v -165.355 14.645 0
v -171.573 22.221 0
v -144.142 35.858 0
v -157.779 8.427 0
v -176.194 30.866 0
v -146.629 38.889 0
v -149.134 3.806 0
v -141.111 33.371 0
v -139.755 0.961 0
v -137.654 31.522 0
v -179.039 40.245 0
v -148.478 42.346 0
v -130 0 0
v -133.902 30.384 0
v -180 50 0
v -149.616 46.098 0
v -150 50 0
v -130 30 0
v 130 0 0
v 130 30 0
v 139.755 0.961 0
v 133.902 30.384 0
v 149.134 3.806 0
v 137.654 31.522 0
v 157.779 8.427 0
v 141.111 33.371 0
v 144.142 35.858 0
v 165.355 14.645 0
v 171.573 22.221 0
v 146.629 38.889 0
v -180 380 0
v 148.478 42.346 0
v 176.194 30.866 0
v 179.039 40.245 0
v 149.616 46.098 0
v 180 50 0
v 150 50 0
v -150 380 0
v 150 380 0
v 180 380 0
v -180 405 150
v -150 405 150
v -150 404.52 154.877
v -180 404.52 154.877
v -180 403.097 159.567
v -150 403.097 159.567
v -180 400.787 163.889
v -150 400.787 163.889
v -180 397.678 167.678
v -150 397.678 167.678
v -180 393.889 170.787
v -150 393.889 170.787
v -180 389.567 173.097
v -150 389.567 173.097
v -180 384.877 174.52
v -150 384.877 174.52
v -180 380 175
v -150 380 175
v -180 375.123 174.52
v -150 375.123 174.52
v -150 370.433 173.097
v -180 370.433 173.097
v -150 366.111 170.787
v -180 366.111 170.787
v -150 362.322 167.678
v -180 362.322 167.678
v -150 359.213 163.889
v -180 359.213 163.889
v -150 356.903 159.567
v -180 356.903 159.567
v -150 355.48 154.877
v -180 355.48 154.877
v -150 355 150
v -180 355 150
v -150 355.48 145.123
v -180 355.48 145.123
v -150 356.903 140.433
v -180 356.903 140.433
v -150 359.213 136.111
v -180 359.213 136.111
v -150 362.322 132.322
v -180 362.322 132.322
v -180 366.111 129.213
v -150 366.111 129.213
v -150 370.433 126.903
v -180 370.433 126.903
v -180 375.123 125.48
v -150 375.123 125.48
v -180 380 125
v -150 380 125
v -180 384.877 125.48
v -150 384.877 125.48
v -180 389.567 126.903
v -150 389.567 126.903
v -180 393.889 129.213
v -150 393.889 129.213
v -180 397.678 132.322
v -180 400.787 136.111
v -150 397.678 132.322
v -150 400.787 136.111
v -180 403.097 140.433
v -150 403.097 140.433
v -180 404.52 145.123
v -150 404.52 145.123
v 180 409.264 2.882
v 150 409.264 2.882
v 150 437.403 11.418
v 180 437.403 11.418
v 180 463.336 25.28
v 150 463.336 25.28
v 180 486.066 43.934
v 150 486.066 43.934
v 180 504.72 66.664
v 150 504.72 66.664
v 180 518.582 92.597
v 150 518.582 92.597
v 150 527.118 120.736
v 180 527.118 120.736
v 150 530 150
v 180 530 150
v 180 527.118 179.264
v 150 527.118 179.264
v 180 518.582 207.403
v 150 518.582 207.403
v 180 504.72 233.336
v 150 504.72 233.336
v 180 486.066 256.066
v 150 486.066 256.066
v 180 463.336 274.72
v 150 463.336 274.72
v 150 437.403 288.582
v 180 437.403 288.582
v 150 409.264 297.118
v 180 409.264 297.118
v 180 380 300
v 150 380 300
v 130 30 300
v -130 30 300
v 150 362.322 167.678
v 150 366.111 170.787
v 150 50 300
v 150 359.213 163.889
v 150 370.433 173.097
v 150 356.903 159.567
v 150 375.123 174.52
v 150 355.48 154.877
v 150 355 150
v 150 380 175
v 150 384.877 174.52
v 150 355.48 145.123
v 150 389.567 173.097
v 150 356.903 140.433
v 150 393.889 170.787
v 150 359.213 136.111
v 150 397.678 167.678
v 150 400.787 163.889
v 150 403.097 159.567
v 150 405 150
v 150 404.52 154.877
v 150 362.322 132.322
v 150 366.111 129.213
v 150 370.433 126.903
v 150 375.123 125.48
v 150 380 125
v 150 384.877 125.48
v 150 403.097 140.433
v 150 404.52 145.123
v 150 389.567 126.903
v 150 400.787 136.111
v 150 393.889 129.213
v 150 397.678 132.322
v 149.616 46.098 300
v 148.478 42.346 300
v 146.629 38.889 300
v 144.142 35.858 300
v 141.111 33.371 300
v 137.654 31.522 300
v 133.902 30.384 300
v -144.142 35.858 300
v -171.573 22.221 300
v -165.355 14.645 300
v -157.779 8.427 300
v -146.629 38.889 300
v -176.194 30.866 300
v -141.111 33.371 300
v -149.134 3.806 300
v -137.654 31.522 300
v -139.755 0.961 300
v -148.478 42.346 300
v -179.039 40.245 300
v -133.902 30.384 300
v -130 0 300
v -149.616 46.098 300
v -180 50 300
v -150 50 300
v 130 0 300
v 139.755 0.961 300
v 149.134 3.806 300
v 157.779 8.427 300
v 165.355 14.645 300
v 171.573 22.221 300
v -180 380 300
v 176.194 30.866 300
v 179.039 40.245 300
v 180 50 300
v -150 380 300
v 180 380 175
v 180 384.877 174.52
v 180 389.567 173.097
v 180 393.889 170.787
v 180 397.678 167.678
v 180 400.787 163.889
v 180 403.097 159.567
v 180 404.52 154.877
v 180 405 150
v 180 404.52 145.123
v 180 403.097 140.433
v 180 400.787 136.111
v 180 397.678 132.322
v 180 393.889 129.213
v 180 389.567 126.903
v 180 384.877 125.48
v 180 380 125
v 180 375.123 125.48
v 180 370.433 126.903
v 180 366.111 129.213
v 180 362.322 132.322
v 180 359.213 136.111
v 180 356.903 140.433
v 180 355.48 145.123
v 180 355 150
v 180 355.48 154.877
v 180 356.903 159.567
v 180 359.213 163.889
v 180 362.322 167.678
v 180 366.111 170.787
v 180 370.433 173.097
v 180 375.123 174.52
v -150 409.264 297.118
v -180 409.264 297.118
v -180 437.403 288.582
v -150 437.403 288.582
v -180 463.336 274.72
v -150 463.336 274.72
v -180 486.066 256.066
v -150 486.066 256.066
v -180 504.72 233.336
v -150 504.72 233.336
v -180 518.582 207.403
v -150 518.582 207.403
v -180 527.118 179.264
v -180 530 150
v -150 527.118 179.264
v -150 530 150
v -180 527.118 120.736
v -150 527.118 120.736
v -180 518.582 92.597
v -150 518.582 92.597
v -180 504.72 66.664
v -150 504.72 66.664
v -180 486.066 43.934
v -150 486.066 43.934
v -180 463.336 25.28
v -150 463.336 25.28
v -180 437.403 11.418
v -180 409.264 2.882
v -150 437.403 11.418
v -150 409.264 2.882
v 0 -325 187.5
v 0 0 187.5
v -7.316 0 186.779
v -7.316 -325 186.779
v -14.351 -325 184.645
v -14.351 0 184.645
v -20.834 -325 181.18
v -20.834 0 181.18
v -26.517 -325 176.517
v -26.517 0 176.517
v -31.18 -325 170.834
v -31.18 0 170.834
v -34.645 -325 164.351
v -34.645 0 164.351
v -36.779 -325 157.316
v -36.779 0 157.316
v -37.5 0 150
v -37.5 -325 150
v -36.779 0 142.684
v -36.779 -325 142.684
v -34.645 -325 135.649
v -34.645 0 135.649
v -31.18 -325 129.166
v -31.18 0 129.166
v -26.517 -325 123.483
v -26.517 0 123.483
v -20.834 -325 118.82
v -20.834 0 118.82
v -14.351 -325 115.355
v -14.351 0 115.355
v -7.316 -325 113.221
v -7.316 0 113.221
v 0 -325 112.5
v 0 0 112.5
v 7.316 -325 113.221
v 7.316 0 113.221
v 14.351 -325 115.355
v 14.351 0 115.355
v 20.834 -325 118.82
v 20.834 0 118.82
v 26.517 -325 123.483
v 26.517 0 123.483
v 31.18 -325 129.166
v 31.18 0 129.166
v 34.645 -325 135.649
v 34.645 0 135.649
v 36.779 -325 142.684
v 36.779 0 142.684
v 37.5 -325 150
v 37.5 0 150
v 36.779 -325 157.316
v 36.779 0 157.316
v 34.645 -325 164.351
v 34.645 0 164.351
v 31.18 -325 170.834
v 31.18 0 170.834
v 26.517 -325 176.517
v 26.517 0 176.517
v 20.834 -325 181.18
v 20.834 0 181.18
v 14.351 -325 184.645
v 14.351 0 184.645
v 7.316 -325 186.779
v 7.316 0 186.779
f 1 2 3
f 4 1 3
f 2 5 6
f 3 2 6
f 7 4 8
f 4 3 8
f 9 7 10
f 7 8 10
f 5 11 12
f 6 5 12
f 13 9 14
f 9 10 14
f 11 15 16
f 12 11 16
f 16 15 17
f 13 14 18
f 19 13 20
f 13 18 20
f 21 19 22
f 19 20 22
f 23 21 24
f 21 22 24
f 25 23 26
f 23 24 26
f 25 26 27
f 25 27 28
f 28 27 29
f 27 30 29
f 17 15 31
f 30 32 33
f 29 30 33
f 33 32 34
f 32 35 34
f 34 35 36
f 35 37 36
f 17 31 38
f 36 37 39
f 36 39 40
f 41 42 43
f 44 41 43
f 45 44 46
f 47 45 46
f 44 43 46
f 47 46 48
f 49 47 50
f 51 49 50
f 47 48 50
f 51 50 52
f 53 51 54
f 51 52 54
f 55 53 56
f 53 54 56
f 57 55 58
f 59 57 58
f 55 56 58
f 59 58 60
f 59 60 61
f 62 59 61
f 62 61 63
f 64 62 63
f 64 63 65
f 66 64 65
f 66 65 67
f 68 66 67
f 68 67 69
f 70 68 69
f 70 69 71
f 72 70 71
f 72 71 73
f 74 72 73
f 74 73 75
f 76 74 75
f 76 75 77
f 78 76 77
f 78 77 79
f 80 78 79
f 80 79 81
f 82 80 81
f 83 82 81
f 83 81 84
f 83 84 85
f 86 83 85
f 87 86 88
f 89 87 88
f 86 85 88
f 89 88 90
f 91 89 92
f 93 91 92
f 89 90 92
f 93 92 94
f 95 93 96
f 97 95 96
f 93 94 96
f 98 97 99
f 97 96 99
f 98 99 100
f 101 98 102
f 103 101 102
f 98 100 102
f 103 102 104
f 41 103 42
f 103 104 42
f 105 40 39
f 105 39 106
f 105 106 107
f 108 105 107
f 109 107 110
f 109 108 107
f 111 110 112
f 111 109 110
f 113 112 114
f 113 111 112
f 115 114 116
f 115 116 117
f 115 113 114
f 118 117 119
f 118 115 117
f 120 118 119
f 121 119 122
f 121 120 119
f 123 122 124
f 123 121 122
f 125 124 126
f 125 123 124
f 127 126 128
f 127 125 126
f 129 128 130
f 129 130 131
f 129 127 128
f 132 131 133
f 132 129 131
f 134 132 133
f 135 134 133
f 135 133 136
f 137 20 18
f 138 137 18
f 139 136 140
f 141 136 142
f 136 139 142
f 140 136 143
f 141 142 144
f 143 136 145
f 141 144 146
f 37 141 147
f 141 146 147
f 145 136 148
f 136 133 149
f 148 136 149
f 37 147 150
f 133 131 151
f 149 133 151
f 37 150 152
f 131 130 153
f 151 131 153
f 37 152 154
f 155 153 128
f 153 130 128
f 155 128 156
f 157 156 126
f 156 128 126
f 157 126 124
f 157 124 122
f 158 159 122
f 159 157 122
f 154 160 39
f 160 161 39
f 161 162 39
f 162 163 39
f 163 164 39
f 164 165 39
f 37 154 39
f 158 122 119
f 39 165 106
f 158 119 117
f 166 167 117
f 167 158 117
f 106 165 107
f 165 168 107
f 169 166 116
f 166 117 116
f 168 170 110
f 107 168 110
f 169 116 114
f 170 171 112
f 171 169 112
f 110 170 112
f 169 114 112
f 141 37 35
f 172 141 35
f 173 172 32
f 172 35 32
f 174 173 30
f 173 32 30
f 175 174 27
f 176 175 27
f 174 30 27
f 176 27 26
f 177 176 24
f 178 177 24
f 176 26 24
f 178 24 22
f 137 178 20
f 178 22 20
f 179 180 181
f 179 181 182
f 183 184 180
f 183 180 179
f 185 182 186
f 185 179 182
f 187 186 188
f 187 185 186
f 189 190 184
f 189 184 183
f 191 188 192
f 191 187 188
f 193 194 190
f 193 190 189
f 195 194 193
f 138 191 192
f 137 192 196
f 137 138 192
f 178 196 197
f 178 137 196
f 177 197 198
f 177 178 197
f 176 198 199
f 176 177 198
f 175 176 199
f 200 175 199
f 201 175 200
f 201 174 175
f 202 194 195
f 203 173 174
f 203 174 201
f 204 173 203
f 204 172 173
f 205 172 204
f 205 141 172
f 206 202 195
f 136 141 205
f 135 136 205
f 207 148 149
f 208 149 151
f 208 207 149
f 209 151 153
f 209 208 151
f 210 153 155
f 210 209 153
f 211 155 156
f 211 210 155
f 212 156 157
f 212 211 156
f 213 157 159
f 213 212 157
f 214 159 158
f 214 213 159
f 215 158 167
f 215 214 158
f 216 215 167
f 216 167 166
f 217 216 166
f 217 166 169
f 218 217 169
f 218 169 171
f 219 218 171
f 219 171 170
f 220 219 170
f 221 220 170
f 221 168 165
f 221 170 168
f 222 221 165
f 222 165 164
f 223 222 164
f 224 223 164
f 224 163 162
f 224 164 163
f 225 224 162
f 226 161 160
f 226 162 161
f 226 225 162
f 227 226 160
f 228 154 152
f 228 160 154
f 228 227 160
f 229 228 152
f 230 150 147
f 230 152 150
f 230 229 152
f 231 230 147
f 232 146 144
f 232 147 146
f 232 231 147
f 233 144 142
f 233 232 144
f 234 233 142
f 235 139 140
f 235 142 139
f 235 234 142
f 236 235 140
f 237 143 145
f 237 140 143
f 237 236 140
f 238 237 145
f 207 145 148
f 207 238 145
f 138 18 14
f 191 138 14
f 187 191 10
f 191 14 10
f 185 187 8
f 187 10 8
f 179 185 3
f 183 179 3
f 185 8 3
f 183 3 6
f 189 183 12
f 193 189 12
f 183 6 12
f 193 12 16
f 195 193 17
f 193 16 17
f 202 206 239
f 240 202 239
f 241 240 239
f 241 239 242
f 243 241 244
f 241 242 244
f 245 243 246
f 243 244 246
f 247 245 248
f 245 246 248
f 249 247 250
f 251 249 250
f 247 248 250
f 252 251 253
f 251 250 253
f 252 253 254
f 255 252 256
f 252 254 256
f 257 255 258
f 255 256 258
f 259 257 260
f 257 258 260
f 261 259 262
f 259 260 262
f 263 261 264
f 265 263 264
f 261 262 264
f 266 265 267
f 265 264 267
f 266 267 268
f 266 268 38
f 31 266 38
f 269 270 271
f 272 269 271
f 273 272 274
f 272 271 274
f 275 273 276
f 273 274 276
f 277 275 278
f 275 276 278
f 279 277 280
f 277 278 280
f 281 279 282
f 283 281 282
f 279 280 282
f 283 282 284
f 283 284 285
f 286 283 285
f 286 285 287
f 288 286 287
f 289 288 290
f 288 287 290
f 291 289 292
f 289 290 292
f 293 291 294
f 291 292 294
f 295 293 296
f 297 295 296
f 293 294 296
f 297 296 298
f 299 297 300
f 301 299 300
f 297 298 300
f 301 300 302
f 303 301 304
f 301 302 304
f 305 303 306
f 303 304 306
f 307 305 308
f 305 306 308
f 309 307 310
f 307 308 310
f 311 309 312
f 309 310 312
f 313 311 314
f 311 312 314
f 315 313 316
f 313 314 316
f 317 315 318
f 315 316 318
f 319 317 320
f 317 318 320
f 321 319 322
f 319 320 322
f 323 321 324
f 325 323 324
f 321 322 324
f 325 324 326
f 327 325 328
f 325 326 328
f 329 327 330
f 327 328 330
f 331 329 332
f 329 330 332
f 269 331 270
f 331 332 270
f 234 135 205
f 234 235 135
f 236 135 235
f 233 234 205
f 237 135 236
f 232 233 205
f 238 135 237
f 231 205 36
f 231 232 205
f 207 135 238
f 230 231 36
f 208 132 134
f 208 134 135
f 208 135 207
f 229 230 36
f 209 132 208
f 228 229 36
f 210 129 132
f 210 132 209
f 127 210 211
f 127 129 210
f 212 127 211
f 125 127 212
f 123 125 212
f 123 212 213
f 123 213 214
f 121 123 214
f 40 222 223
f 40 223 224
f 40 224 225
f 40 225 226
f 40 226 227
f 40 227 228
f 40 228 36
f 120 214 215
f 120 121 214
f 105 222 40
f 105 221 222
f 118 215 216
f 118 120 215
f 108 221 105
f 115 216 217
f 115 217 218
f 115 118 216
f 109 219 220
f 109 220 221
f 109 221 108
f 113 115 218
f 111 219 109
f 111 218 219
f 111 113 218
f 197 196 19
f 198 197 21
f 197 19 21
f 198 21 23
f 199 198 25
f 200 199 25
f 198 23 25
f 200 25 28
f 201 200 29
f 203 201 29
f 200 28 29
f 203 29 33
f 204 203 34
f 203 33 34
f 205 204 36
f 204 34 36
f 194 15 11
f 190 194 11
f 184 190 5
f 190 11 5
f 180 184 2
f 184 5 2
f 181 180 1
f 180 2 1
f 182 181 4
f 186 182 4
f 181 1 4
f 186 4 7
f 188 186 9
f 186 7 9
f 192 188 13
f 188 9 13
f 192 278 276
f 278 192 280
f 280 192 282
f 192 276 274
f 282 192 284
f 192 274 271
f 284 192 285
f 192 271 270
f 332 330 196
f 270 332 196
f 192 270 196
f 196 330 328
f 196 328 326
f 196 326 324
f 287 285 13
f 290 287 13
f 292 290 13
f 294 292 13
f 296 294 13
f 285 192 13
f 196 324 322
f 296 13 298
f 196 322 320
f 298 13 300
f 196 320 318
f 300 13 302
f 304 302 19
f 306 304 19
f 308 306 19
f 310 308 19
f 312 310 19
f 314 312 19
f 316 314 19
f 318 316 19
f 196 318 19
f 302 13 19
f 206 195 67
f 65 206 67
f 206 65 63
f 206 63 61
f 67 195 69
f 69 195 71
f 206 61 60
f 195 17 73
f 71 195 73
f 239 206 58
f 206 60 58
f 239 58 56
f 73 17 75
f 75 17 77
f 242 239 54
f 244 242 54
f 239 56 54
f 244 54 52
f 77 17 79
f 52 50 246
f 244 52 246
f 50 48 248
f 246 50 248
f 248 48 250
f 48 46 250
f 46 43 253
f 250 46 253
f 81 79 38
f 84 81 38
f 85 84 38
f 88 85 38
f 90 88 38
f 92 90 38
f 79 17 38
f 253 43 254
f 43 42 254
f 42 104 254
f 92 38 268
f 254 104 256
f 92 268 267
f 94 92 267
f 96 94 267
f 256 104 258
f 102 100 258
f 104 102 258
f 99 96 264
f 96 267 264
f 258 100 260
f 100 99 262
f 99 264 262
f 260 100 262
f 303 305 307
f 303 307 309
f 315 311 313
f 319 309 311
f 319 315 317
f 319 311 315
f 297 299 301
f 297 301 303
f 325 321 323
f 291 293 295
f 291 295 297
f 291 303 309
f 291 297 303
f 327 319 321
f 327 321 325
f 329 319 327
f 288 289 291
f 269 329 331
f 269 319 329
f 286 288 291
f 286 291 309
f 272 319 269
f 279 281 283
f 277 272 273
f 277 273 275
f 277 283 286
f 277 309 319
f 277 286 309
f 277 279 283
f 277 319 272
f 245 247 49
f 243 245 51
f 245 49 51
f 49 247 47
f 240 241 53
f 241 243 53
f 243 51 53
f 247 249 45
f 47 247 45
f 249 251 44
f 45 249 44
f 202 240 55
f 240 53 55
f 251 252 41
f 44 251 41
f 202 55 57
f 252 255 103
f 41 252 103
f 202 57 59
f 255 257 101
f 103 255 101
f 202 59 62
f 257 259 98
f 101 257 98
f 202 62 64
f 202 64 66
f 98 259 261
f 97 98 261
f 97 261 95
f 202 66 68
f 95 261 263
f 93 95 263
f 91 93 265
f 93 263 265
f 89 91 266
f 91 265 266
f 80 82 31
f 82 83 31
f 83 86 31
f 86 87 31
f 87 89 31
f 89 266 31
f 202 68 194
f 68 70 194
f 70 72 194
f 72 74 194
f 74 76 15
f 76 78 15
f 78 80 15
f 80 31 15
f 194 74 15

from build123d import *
from build123d.topology import SkipClean

# Parameters (mm, degrees)
BOSS_EXTRUDE1_DEPTH = 300
SKETCH2_R           = 37.5
BOSS_EXTRUDE2_DEPTH = 325
BOSS_EXTRUDE3_DEPTH = 30
SKETCH3_4_R         = 25
CUT_EXTRUDE1_DEPTH  = 360
BOSS_EXTRUDE4_START = -30
BOSS_EXTRUDE4_DEPTH = 30
SKETCH3_9_R         = 25
CUT_EXTRUDE2_DEPTH  = 360


with BuildPart() as part:
    # Sketch1 → Boss-Extrude1 (new body)
    with BuildSketch(Plane.XY):
        with BuildLine():
            Line((-130, 0), (130, 0))
            ThreePointArc((130, 0), (165.355339059, 14.644660941), (180, 50))
            Line((180, 50), (180, 380))
            Line((180, 380), (150, 380))
            Line((150, 380), (150, 50))
            ThreePointArc((150, 50), (144.142135624, 35.857864376), (130, 30))
            Line((130, 30), (-130, 30))
            ThreePointArc((-130, 30), (-144.142135624, 35.857864376), (-150, 50))
            Line((-150, 50), (-150, 380))
            Line((-150, 380), (-180, 380))
            Line((-180, 380), (-180, 50))
            ThreePointArc((-180, 50), (-165.355339059, 14.644660941), (-130, 0))
        make_face()
    extrude(amount=BOSS_EXTRUDE1_DEPTH)

    # Sketch2 → Boss-Extrude2 (add)
    with BuildSketch(Plane.XZ):
        with Locations(Location((0, 150, 0), (0, 0, 90))):
            Circle(SKETCH2_R)
    extrude(amount=BOSS_EXTRUDE2_DEPTH)

    # Sketch3 → Boss-Extrude3 (add)
    with BuildSketch(Plane(origin=(180, 0, 0), x_dir=(0, 0, -1), z_dir=(1, 0, 0))):
        with BuildLine():
            ThreePointArc((0, 380), (-150, 530), (-300, 380))
            Line((-300, 380), (-175, 380))
            ThreePointArc((-175, 380), (-150, 405), (-125, 380))
            Line((-125, 380), (0, 380))
        make_face()
    extrude(amount=-BOSS_EXTRUDE3_DEPTH)

    # Sketch3<4> → Cut-Extrude1 (cut)
    with SkipClean():  # the faces are left unmerged after this step: merging them gives an invalid solid
        with BuildSketch(Plane(origin=(180, 0, 0), x_dir=(0, 0, -1), z_dir=(1, 0, 0))):
            with Locations(Location((-150, 380, 0), (0, 0, 90))):
                Circle(SKETCH3_4_R)
        extrude(amount=-CUT_EXTRUDE1_DEPTH, mode=Mode.SUBTRACT)

    # Sketch6 → Boss-Extrude4 (add)
    with BuildSketch(Plane.ZY.offset(180).offset(BOSS_EXTRUDE4_START)):
        with BuildLine():
            Line((0, 380), (0, 50))
            Line((0, 50), (300, 50))
            Line((300, 50), (300, 380))
            ThreePointArc((300, 380), (150, 530), (0, 380))
        make_face()
    extrude(amount=BOSS_EXTRUDE4_DEPTH)

    # Sketch3<9> → Cut-Extrude2 (cut)
    with BuildSketch(Plane(origin=(180, 0, 0), x_dir=(0, 0, -1), z_dir=(1, 0, 0))):
        with Locations(Location((-150, 380, 0), (0, 0, 90))):
            Circle(SKETCH3_9_R)
    extrude(amount=-CUT_EXTRUDE2_DEPTH, mode=Mode.SUBTRACT)


solid = part.part
